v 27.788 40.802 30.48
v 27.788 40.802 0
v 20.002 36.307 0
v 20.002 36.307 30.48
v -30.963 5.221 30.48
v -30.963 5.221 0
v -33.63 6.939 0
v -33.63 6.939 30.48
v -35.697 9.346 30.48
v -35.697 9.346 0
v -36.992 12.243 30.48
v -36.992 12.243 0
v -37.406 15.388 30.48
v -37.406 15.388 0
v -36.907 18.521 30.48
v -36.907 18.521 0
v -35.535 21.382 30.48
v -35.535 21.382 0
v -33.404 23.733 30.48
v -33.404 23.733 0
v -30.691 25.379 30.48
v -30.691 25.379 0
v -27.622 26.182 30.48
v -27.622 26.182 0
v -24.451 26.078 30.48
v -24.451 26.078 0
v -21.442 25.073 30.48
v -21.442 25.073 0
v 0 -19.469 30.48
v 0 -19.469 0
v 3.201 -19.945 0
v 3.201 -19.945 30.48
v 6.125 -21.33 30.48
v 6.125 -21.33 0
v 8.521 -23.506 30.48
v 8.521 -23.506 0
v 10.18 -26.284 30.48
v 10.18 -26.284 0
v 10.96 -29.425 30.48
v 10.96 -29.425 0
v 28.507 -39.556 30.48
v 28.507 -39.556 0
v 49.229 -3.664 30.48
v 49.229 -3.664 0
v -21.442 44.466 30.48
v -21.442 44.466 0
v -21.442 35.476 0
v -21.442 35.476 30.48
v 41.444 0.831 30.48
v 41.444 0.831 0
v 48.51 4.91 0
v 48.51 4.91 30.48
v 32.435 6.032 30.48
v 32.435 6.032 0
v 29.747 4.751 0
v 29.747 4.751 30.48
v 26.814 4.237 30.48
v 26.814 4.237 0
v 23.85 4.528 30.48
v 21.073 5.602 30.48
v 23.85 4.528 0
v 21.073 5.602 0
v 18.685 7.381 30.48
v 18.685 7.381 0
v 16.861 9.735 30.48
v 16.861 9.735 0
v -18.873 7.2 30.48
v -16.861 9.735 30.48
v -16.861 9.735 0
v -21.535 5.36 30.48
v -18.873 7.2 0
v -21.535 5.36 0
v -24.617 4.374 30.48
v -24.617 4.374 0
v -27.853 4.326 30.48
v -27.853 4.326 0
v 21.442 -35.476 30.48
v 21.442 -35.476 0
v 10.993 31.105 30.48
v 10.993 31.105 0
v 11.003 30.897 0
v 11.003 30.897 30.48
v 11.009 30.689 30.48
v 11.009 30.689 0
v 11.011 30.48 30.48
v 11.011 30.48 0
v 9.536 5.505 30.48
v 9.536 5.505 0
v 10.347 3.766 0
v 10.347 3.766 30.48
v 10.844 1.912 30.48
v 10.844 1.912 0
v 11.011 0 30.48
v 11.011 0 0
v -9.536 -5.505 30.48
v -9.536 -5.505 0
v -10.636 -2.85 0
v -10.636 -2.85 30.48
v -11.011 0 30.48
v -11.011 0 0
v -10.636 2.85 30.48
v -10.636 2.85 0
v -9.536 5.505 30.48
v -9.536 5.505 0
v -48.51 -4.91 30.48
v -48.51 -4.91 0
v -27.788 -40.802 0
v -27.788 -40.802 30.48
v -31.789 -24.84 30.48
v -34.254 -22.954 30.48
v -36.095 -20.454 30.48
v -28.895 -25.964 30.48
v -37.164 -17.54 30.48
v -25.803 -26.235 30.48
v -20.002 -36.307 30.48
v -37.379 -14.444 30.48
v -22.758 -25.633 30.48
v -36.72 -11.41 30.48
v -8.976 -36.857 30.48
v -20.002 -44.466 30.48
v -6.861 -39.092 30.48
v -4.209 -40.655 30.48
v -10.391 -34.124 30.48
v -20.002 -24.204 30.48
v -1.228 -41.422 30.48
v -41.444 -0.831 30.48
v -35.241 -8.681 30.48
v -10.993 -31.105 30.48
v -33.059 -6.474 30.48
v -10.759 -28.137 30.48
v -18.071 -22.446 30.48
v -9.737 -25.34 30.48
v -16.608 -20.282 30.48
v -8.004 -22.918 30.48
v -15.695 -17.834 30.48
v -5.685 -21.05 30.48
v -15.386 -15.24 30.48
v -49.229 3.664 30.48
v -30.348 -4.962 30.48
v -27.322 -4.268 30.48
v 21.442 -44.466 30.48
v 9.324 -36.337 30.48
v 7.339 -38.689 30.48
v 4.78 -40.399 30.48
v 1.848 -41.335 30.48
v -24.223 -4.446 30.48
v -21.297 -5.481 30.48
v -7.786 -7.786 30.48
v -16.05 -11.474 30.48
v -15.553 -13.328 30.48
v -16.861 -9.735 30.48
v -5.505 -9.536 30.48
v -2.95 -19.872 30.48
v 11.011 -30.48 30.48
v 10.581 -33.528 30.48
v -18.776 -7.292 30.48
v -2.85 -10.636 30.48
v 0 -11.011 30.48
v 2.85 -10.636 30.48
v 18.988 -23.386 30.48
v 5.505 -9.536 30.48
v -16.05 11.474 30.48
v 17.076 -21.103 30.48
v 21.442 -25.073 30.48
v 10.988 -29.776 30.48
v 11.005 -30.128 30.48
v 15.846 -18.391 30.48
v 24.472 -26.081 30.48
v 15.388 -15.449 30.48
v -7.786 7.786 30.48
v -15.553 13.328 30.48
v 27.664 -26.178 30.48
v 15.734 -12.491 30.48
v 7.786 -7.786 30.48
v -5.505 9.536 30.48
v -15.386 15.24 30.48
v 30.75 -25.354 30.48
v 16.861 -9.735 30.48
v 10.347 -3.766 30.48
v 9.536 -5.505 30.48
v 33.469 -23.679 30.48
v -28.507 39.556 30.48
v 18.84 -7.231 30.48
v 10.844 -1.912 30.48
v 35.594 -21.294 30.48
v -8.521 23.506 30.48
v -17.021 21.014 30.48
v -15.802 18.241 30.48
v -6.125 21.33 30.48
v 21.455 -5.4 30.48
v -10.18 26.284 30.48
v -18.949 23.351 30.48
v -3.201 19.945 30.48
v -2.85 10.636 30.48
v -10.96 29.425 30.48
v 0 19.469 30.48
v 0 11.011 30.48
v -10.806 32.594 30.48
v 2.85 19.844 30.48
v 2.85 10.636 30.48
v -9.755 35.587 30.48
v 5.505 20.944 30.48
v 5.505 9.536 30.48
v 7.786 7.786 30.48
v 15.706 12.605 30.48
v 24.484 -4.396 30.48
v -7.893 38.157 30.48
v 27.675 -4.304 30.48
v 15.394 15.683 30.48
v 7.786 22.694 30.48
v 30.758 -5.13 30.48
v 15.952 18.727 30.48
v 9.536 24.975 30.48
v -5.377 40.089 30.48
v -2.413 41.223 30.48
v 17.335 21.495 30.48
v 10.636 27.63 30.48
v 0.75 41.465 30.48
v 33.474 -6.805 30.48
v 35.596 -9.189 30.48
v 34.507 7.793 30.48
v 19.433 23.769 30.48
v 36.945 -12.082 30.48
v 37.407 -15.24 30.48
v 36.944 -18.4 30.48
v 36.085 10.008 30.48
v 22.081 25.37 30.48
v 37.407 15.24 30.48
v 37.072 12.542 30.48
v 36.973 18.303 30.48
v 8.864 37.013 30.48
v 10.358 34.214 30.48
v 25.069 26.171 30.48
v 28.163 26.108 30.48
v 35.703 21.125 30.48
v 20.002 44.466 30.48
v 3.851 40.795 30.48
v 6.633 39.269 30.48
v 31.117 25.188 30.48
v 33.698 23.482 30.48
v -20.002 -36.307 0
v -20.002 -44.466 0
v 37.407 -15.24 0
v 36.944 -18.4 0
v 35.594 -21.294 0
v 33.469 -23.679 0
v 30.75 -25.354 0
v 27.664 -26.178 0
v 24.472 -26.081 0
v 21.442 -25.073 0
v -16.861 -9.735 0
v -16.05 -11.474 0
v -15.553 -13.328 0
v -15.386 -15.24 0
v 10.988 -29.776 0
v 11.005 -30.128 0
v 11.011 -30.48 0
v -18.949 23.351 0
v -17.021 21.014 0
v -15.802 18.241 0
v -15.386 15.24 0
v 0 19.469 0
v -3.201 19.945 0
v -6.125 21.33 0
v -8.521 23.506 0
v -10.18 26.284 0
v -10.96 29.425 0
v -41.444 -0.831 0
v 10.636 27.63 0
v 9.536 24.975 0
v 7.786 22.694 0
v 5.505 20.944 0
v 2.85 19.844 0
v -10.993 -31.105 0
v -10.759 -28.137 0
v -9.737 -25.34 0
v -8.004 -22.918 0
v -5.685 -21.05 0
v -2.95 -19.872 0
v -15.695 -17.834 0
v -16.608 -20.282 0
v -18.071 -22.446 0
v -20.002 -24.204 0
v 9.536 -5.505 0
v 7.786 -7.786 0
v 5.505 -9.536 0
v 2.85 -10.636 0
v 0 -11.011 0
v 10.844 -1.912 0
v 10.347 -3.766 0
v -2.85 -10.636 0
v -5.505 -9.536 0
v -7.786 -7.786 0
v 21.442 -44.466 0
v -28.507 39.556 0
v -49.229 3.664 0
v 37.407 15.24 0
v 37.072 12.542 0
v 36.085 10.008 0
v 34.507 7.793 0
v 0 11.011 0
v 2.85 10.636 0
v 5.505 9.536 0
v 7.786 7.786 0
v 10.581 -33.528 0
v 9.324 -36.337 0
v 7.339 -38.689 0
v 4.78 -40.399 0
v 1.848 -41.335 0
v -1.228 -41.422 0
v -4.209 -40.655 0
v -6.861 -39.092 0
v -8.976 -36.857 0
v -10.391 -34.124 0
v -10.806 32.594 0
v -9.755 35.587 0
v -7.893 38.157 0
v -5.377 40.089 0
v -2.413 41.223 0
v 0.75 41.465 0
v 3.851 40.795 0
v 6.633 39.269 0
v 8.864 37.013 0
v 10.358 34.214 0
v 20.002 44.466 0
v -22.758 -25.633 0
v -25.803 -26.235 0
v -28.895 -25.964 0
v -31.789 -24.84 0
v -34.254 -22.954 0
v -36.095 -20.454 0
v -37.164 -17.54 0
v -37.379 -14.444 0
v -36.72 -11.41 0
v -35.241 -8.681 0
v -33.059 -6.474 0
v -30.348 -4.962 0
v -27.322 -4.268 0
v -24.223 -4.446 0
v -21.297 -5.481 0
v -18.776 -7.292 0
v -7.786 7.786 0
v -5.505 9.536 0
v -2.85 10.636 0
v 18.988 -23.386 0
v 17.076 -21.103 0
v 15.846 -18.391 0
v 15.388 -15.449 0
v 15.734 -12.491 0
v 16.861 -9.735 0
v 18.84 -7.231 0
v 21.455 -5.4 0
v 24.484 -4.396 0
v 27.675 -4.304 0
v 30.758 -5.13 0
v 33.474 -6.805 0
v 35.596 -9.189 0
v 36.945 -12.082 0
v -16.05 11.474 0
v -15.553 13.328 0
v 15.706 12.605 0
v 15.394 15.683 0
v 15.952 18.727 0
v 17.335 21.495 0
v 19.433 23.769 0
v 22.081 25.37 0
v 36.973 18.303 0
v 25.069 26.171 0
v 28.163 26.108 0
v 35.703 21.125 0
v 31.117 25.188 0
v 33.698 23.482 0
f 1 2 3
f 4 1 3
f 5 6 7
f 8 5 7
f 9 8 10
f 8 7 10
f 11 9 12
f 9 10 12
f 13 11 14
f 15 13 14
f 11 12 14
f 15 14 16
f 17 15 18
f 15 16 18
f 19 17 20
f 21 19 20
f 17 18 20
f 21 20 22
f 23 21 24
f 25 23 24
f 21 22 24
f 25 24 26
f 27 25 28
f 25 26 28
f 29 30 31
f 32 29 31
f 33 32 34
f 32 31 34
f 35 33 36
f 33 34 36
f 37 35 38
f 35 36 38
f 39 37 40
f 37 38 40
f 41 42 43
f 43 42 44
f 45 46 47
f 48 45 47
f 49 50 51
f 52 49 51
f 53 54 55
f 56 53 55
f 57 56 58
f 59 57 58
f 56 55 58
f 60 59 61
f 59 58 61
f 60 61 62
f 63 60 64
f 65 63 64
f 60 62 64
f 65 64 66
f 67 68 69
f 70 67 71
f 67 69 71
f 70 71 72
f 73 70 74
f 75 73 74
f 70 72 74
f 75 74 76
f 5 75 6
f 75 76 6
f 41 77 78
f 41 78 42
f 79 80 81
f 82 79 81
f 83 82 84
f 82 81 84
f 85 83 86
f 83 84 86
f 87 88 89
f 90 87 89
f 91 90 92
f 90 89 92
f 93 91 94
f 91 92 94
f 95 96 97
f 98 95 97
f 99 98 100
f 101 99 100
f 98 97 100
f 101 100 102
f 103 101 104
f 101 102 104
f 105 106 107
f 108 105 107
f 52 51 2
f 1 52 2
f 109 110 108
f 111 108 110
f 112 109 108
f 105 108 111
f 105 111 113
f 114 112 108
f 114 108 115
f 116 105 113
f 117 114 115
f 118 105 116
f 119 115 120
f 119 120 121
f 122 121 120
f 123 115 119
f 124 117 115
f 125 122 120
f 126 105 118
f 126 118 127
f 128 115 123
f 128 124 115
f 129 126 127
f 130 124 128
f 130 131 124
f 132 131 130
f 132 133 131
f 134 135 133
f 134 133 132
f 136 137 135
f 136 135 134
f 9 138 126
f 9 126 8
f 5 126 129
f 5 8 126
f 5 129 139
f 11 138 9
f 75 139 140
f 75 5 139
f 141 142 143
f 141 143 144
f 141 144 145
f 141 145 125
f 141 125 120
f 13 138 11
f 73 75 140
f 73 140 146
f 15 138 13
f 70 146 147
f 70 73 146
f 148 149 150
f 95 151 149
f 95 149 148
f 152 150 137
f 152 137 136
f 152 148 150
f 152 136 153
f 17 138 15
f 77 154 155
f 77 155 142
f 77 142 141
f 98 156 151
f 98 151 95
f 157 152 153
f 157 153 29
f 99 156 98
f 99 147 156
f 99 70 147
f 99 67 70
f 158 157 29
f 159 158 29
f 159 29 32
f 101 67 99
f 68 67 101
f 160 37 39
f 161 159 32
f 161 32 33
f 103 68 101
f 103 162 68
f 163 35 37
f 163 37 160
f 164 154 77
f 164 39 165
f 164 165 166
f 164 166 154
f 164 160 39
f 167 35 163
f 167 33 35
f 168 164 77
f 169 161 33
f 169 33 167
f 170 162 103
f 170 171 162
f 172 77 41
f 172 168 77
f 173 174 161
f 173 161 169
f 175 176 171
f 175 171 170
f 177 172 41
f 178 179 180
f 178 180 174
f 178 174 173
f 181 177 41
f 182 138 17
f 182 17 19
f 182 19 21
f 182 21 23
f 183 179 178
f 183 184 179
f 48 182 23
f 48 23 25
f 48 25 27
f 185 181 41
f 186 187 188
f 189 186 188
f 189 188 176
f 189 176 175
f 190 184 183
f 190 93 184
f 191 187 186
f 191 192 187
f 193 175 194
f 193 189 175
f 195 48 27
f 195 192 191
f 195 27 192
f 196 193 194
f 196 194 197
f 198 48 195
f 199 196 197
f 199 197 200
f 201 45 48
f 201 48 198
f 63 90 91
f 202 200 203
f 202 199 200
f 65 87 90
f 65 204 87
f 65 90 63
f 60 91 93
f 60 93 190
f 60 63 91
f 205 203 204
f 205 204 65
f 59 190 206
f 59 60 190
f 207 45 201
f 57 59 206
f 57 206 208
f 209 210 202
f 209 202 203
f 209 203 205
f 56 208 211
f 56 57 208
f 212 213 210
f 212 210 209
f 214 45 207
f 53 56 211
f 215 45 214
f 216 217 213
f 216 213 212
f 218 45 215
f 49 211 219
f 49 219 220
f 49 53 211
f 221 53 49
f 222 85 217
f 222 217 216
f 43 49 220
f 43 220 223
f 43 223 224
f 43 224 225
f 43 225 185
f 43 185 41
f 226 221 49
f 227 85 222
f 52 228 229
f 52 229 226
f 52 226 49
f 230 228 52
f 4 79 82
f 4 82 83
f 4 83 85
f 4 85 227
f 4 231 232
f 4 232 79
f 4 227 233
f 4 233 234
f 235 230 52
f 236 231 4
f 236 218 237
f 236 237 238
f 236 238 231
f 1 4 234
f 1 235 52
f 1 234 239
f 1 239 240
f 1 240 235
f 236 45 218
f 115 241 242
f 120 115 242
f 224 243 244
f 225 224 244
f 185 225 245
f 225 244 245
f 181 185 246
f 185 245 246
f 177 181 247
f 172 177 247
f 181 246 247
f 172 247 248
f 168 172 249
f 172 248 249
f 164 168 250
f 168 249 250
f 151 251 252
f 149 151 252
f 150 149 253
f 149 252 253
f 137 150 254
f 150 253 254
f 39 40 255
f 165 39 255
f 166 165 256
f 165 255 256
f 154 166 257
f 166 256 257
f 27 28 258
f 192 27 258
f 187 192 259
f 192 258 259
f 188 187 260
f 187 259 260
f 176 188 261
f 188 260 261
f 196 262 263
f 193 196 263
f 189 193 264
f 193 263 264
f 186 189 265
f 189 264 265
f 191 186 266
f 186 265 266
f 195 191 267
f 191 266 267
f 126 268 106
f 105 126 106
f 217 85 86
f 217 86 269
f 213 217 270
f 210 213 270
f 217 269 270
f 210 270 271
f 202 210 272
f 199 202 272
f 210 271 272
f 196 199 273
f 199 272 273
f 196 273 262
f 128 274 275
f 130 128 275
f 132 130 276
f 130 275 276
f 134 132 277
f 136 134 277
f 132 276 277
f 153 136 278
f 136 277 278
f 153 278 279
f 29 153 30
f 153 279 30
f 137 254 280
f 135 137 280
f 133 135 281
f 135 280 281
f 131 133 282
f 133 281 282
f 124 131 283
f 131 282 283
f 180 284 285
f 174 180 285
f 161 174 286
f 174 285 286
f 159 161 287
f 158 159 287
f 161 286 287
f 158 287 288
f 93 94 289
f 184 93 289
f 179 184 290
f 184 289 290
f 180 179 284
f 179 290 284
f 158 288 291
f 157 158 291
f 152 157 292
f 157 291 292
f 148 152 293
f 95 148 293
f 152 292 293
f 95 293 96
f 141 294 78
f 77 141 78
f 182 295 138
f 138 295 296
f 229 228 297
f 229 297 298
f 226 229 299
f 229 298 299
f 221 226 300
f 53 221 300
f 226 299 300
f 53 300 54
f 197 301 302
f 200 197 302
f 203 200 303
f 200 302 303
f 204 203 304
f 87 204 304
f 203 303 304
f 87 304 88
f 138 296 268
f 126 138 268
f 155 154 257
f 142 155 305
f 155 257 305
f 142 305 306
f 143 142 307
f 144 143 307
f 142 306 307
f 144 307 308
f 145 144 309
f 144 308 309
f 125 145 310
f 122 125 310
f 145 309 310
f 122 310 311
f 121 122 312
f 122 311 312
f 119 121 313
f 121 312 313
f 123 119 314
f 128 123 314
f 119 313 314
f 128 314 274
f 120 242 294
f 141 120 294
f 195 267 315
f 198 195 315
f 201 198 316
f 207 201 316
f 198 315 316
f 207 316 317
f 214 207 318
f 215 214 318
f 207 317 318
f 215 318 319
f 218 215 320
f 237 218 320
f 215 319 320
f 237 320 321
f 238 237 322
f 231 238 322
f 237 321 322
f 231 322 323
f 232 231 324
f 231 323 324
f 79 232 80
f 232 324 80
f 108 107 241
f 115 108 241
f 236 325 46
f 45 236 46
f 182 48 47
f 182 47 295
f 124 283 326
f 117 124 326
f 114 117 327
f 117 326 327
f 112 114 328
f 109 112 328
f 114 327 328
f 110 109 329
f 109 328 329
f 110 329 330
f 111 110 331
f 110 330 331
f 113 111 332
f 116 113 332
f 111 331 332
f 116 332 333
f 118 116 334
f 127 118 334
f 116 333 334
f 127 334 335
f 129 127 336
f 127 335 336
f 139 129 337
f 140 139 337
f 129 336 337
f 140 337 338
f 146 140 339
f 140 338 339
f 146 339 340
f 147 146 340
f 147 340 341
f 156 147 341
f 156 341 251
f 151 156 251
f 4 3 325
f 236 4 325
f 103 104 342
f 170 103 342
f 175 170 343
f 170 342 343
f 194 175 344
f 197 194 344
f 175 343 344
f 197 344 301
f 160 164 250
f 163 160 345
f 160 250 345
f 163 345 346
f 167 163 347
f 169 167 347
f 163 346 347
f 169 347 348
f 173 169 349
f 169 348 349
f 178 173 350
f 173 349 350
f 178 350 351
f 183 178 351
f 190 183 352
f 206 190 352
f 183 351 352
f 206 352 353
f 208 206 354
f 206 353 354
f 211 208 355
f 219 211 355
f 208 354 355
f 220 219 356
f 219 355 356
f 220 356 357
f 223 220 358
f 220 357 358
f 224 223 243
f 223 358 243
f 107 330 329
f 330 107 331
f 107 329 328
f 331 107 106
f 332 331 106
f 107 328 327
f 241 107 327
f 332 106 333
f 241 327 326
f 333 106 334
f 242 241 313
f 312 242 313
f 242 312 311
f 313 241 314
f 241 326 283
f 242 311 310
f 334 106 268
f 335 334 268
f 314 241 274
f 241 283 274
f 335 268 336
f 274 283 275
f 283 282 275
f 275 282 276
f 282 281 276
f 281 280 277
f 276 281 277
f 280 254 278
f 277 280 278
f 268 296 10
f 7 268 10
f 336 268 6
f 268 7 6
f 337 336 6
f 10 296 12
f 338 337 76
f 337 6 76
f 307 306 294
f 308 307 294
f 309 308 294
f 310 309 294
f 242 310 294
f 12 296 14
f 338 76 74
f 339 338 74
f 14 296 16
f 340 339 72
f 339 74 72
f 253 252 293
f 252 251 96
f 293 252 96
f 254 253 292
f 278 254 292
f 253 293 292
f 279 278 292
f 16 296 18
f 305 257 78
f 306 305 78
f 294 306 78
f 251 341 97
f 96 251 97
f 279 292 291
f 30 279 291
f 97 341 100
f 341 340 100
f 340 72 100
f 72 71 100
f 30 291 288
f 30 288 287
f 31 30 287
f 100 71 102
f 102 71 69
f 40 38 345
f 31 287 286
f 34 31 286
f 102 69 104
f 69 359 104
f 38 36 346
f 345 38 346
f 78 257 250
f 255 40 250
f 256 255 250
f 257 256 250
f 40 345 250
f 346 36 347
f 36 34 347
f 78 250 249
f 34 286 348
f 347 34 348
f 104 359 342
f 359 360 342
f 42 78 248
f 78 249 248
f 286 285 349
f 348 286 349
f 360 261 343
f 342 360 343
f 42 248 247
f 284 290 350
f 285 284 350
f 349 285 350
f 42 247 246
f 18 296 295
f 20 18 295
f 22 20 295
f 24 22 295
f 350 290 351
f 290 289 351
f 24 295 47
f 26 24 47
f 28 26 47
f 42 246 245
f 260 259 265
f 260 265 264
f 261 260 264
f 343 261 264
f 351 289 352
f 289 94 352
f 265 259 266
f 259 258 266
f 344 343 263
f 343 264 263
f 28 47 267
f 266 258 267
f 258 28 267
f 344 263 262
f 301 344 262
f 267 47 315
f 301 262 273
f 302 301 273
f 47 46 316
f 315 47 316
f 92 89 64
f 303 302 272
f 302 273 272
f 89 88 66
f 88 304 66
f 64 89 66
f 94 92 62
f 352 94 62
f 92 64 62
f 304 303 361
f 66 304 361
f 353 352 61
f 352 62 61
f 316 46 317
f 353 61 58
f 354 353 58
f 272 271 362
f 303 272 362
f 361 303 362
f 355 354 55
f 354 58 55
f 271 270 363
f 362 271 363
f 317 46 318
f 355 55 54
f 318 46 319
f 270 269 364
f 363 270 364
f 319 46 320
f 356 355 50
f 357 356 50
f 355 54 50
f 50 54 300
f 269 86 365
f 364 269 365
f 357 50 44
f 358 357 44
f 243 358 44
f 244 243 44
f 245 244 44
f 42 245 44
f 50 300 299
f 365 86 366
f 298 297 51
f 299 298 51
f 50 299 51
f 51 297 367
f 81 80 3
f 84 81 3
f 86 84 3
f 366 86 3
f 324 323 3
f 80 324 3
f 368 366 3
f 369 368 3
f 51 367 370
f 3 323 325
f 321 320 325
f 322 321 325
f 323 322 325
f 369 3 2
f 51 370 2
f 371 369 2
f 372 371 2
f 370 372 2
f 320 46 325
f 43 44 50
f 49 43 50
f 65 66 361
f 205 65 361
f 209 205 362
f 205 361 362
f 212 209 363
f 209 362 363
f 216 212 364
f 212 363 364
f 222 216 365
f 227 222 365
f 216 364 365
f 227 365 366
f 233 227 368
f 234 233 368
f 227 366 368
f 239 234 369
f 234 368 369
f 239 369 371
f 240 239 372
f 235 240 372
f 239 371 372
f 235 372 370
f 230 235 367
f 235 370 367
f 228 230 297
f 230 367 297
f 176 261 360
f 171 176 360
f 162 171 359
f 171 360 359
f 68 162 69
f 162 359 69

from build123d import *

# Parameters (mm, degrees)
F1_DEPTH = 30.48


with BuildPart() as f1:
    # F0 (on Top) → F1 (new body)
    with BuildSketch(Plane.XY):
        with BuildLine():
            ThreePointArc((9.5357191185, 5.50545), (10.6357126807, 2.8498306237), (11.0109, 0))
            ThreePointArc((11.0109, 0), (10.6357126807, -2.8498306237), (9.5357191185, -5.50545))
            Line((9.5357191185, -5.50545), (16.8607351888, -9.73455))
            ThreePointArc((16.8607351888, -9.73455), (23.039686637, -4.7532450387), (30.9627198303, -5.2205619926))
            Line((30.9627198303, -5.2205619926), (41.444029659, 0.8308250585))
            Line((41.444029659, 0.8308250585), (32.4346536017, 6.0323907505))
            ThreePointArc((32.4346536017, 6.0323907505), (23.8499553367, 4.5276117601), (16.8607351888, 9.73455))
            Line((16.8607351888, 9.73455), (9.5357191185, 5.50545))
        make_face()
        with BuildLine():
            ThreePointArc((0, 11.0109), (5.50545, 9.5357191185), (9.5357191185, 5.50545))
            Line((9.5357191185, 5.50545), (16.8607351888, 9.73455))
            ThreePointArc((16.8607351888, 9.73455), (15.6362742725, 17.5763314035), (20.0024992228, 24.204220947))
            Line((20.0024992228, 24.204220947), (20.0024992228, 36.3069950492))
            Line((20.0024992228, 36.3069950492), (10.9931231654, 31.1054293572))
            ThreePointArc((10.9931231654, 31.1054293572), (11.0064548941, 30.7928409727), (11.0109, 30.48))
            ThreePointArc((11.0109, 30.48), (7.785882057, 22.694117943), (0, 19.4691))
            Line((0, 19.4691), (0, 11.0109))
        make_face()
        with BuildLine():
            Line((16.8607351888, -9.73455), (9.5357191185, -5.50545))
            ThreePointArc((9.5357191185, -5.50545), (5.50545, -9.5357191185), (0, -11.0109))
            Line((0, -11.0109), (0, -19.4691))
            ThreePointArc((0, -19.4691), (7.4034123646, -22.3295764423), (10.9602206075, -29.4247829396))
            Line((10.9602206075, -29.4247829396), (21.4415304363, -35.4761699907))
            Line((21.4415304363, -35.4761699907), (21.4415304363, -25.0730386068))
            ThreePointArc((21.4415304363, -25.0730386068), (15.8460044711, -18.3908613207), (16.8607351888, -9.73455))
        make_face()
        with BuildLine():
            ThreePointArc((-9.5357191185, 5.50545), (-5.50545, 9.5357191185), (0, 11.0109))
            Line((0, 11.0109), (0, 19.4691))
            ThreePointArc((0, 19.4691), (-7.4034123646, 22.3295764423), (-10.9602206075, 29.4247829396))
            Line((-10.9602206075, 29.4247829396), (-21.4415304363, 35.4761699907))
            Line((-21.4415304363, 35.4761699907), (-21.4415304363, 25.0730386068))
            ThreePointArc((-21.4415304363, 25.0730386068), (-17.0210052498, 21.0141556767), (-15.3855543073, 15.24))
            ThreePointArc((-15.3855543073, 15.24), (-15.7607416267, 12.3901693763), (-16.8607351888, 9.73455))
            Line((-16.8607351888, 9.73455), (-9.5357191185, 5.50545))
        make_face()
        with BuildLine():
            Line((0, -19.4691), (0, -11.0109))
            ThreePointArc((0, -11.0109), (-5.50545, -9.5357191185), (-9.5357191185, -5.50545))
            Line((-9.5357191185, -5.50545), (-16.8607351888, -9.73455))
            ThreePointArc((-16.8607351888, -9.73455), (-15.7607416267, -12.3901693763), (-15.3855543073, -15.24))
            ThreePointArc((-15.3855543073, -15.24), (-16.6076055791, -20.2816623632), (-20.0024992228, -24.204220947))
            Line((-20.0024992228, -24.204220947), (-20.0024992228, -36.3069950492))
            Line((-20.0024992228, -36.3069950492), (-10.9931231654, -31.1054293572))
            ThreePointArc((-10.9931231654, -31.1054293572), (-8.0039508656, -22.9184730808), (0, -19.4691))
        make_face()
        with BuildLine():
            ThreePointArc((-9.5357191185, -5.50545), (-11.0109, 0), (-9.5357191185, 5.50545))
            Line((-9.5357191185, 5.50545), (-16.8607351888, 9.73455))
            ThreePointArc((-16.8607351888, 9.73455), (-23.039686637, 4.7532450387), (-30.9627198303, 5.2205619926))
            Line((-30.9627198303, 5.2205619926), (-41.444029659, -0.8308250585))
            Line((-41.444029659, -0.8308250585), (-32.4346536017, -6.0323907505))
            ThreePointArc((-32.4346536017, -6.0323907505), (-23.8499553367, -4.5276117601), (-16.8607351888, -9.73455))
            Line((-16.8607351888, -9.73455), (-9.5357191185, -5.50545))
        make_face()
        with BuildLine():
            Line((20.0024992228, 36.3069950492), (20.0024992228, 24.204220947))
            ThreePointArc((20.0024992228, 24.204220947), (31.4381166706, 25.0288487283), (37.4073543073, 15.24))
            ThreePointArc((37.4073543073, 15.24), (36.0847443376, 10.0077007826), (32.4346536017, 6.0323907505))
            Line((32.4346536017, 6.0323907505), (41.444029659, 0.8308250585))
            Line((41.444029659, 0.8308250585), (48.509925581, 4.9103219711))
            Line((48.509925581, 4.9103219711), (27.7879107515, 40.8019044911))
            Line((27.7879107515, 40.8019044911), (20.0024992228, 36.3069950492))
        make_face()
        with BuildLine():
            Line((41.444029659, 0.8308250585), (30.9627198303, -5.2205619926))
            ThreePointArc((30.9627198303, -5.2205619926), (35.6570863553, -9.2834395091), (37.4073543073, -15.24))
            ThreePointArc((37.4073543073, -15.24), (32.1706099841, -24.6154490576), (21.4415304363, -25.0730386068))
            Line((21.4415304363, -25.0730386068), (21.4415304363, -35.4761699907))
            Line((21.4415304363, -35.4761699907), (28.5074263583, -39.5556669033))
            Line((28.5074263583, -39.5556669033), (49.2294411878, -3.6640843834))
            Line((49.2294411878, -3.6640843834), (41.444029659, 0.8308250585))
        make_face()
        with BuildLine():
            Line((-21.4415304363, 35.4761699907), (-10.9602206075, 29.4247829396))
            ThreePointArc((-10.9602206075, 29.4247829396), (-0.8404842294, 41.4587752081), (10.9931231654, 31.1054293572))
            Line((10.9931231654, 31.1054293572), (20.0024992228, 36.3069950492))
            Line((20.0024992228, 36.3069950492), (20.0024992228, 44.4659888744))
            Line((20.0024992228, 44.4659888744), (-21.4415304363, 44.4659888744))
            Line((-21.4415304363, 44.4659888744), (-21.4415304363, 35.4761699907))
        make_face()
        with BuildLine():
            Line((21.4415304363, -35.4761699907), (10.9602206075, -29.4247829396))
            ThreePointArc((10.9602206075, -29.4247829396), (10.9982228541, -29.9517833197), (11.0109, -30.48))
            ThreePointArc((11.0109, -30.48), (0.3128409727, -41.4864548941), (-10.9931231654, -31.1054293572))
            Line((-10.9931231654, -31.1054293572), (-20.0024992228, -36.3069950492))
            Line((-20.0024992228, -36.3069950492), (-20.0024992228, -44.4659888744))
            Line((-20.0024992228, -44.4659888744), (21.4415304363, -44.4659888744))
            Line((21.4415304363, -44.4659888744), (21.4415304363, -35.4761699907))
        make_face()
        with BuildLine():
            Line((-41.444029659, -0.8308250585), (-30.9627198303, 5.2205619926))
            ThreePointArc((-30.9627198303, 5.2205619926), (-36.3245946547, 20.0015069099), (-21.4415304363, 25.0730386068))
            Line((-21.4415304363, 25.0730386068), (-21.4415304363, 35.4761699907))
            Line((-21.4415304363, 35.4761699907), (-28.5074263583, 39.5556669033))
            Line((-28.5074263583, 39.5556669033), (-49.2294411878, 3.6640843834))
            Line((-49.2294411878, 3.6640843834), (-41.444029659, -0.8308250585))
        make_face()
        with BuildLine():
            ThreePointArc((-20.0024992228, -24.204220947), (-35.4841104253, -21.4572682982), (-32.4346536017, -6.0323907505))
            Line((-32.4346536017, -6.0323907505), (-41.444029659, -0.8308250585))
            Line((-41.444029659, -0.8308250585), (-48.509925581, -4.9103219711))
            Line((-48.509925581, -4.9103219711), (-27.7879107515, -40.8019044911))
            Line((-27.7879107515, -40.8019044911), (-20.0024992228, -36.3069950492))
            Line((-20.0024992228, -36.3069950492), (-20.0024992228, -24.204220947))
        make_face()
    extrude(amount=F1_DEPTH)


solid = f1.part
